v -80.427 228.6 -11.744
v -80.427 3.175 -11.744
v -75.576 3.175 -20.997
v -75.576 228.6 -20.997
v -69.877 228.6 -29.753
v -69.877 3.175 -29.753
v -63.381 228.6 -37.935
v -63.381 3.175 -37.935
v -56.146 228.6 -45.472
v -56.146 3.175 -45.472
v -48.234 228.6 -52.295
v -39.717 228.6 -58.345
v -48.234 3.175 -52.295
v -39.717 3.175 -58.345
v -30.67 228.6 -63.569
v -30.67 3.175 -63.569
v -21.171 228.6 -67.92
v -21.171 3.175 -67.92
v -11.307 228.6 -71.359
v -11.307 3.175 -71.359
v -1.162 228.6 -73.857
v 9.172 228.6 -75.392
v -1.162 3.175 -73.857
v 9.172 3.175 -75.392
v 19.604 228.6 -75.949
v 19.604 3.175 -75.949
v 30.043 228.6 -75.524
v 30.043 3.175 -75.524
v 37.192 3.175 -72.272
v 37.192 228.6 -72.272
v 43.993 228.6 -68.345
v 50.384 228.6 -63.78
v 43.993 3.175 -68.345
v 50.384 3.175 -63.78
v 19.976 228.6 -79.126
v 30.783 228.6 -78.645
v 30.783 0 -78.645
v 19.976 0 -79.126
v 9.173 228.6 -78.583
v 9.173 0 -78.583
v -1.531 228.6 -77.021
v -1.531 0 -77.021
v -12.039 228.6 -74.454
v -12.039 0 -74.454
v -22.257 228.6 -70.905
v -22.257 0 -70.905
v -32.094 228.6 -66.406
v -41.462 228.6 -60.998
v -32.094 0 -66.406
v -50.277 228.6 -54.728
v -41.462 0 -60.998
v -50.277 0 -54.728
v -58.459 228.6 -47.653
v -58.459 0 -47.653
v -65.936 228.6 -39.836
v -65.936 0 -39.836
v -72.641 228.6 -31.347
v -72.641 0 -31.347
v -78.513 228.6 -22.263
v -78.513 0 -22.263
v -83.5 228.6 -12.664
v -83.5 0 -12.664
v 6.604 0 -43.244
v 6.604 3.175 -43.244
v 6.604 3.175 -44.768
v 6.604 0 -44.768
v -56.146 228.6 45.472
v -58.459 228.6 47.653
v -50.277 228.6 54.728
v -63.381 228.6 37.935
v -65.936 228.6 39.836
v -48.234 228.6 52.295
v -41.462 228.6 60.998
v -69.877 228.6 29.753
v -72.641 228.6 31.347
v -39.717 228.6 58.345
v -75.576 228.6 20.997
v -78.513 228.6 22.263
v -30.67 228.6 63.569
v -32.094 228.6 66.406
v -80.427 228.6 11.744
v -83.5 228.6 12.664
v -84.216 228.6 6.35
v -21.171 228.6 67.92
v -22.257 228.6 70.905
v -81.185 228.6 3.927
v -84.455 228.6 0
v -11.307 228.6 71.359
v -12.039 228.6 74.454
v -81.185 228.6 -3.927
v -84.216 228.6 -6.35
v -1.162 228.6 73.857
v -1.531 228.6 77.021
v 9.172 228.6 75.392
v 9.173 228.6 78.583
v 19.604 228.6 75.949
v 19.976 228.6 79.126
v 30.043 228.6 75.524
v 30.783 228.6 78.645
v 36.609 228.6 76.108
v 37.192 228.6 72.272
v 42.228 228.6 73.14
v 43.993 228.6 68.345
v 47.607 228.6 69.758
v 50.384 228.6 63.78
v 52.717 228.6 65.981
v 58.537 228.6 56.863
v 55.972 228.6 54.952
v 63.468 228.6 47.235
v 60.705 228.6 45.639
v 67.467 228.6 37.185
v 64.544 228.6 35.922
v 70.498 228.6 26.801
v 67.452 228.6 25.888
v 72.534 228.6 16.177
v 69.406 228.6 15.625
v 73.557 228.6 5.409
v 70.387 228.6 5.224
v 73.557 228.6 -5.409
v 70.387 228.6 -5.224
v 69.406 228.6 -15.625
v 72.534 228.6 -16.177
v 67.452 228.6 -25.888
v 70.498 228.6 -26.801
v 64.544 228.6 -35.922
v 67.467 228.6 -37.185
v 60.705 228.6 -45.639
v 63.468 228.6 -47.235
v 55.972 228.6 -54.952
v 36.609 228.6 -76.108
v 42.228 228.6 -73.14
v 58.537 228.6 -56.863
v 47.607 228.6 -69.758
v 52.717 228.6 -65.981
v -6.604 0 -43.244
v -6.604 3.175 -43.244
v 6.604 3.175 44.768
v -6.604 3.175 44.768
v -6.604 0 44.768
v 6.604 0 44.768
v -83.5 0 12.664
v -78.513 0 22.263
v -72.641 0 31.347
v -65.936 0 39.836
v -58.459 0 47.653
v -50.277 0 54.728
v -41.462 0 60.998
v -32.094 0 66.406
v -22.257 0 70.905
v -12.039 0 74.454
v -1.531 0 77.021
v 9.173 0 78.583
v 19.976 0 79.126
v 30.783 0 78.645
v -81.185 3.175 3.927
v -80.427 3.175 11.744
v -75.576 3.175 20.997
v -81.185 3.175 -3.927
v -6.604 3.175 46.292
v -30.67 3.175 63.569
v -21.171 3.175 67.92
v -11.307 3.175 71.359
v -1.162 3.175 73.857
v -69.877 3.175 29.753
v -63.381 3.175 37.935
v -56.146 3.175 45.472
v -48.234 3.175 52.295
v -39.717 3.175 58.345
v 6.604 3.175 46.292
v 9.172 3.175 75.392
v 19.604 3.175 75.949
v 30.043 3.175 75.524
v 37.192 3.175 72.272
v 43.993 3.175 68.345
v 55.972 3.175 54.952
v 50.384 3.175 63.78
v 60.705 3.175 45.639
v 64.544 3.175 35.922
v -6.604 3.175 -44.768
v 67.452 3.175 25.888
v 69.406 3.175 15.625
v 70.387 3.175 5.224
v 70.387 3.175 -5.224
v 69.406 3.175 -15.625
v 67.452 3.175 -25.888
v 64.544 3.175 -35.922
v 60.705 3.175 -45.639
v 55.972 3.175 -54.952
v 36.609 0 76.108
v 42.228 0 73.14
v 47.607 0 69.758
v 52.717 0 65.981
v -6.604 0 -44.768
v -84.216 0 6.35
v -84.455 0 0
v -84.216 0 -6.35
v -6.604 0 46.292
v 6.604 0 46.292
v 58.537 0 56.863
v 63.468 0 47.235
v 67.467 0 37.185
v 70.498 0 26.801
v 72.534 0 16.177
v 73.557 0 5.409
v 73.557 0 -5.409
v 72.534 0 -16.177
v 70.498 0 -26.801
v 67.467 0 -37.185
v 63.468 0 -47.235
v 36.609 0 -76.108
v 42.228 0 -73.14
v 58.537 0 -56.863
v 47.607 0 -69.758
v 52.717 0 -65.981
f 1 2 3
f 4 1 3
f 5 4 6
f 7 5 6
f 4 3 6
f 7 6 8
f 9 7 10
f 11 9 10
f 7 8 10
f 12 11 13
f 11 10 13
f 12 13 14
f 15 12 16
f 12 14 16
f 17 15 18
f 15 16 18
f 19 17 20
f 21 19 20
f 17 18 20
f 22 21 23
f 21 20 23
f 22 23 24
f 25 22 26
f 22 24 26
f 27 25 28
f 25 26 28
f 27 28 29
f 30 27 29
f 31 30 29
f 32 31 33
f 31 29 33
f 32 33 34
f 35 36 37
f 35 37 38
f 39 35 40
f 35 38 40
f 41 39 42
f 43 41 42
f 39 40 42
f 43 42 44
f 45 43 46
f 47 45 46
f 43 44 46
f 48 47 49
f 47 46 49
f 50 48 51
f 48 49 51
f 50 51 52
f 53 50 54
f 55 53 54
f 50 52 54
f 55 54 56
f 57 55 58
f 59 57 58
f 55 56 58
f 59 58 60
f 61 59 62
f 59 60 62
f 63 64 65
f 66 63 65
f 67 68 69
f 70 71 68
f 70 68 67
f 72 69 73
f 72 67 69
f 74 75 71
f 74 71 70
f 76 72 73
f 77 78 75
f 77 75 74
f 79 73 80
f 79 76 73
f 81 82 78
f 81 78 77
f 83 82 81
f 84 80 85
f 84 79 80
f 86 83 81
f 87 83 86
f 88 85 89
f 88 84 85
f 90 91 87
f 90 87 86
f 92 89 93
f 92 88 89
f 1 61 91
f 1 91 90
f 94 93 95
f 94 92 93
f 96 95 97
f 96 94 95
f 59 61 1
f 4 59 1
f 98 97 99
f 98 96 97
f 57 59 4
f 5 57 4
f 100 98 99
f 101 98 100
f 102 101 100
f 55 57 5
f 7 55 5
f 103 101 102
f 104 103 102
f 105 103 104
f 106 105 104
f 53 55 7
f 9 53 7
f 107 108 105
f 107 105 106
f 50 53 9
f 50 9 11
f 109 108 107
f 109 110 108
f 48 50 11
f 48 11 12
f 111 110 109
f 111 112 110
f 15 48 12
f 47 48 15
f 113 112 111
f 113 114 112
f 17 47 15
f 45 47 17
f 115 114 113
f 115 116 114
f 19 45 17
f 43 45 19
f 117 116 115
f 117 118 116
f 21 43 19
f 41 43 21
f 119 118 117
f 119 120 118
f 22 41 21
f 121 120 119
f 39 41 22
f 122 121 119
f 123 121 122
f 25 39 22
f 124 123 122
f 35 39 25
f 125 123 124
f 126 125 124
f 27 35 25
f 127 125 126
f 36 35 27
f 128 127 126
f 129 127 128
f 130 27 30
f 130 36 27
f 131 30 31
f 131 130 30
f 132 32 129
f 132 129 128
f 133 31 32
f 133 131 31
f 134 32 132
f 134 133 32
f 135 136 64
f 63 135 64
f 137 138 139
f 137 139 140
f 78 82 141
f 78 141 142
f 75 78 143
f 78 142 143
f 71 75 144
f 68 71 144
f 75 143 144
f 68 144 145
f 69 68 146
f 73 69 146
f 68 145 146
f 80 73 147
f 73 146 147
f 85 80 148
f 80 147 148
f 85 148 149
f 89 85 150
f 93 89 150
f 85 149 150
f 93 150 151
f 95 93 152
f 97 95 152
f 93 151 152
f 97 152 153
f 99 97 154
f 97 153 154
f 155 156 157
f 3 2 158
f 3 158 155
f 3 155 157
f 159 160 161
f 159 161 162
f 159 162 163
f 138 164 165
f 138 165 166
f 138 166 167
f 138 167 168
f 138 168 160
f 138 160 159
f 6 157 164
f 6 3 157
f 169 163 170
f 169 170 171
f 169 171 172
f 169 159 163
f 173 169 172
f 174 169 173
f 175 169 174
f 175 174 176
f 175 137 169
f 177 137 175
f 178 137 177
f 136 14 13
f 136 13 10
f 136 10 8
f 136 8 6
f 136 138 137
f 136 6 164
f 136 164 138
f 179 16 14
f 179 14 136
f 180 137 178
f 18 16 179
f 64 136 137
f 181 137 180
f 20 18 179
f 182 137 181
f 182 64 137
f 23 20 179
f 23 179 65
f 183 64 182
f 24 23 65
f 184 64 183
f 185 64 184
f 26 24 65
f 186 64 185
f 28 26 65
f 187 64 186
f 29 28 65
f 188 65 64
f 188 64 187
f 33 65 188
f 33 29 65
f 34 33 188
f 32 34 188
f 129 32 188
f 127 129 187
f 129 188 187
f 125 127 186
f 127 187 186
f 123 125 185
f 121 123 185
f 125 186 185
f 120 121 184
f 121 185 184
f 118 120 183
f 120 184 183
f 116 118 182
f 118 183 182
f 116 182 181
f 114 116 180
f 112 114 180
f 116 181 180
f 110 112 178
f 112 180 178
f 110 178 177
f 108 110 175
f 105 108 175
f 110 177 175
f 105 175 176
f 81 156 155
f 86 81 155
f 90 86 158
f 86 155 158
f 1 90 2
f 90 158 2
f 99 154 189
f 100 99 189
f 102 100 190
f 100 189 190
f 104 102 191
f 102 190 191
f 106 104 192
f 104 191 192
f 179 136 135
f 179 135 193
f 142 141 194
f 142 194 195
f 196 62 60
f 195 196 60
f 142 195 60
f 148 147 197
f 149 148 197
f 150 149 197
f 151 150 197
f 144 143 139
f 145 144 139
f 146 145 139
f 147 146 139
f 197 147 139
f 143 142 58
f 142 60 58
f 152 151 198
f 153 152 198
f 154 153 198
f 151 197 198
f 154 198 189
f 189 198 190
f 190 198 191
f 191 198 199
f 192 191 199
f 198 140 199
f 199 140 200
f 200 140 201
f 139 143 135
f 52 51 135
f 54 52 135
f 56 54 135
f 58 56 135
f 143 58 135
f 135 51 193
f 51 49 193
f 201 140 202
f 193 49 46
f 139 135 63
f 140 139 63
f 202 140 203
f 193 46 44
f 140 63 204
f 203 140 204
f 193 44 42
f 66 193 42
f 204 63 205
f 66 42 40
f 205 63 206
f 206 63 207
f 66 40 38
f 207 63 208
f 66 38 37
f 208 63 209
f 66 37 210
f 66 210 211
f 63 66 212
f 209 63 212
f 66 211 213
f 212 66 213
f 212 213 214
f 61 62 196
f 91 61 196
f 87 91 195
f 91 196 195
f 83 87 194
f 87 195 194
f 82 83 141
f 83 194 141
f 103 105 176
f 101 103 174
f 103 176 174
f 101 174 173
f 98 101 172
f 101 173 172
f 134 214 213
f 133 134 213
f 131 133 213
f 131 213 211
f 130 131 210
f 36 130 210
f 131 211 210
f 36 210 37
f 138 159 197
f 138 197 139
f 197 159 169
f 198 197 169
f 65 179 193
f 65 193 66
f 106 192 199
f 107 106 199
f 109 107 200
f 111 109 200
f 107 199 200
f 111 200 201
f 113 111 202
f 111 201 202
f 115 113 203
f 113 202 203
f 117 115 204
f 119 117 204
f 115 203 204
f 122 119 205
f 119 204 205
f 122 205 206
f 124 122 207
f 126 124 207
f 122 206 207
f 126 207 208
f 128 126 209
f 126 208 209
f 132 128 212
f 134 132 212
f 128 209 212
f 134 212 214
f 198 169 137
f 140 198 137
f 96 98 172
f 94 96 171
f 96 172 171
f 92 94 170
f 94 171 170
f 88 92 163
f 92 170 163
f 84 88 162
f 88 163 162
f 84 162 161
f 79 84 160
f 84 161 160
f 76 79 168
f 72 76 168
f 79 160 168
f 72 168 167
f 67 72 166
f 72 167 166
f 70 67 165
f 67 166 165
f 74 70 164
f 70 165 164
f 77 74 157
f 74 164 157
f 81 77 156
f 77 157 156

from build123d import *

# Parameters (mm, degrees)
SIDES_THE_GAP_VALUE_CAN_BE_CHANGED_DEPTH      = 228.6
BASE_DEPTH                                    = 3.175
SKETCH8_W                                     = 13.208
SKETCH8_H                                     = 1.524
SHOCK_CORD_CUTS_CAN_BE_MOVED_CURRENT_DI_DEPTH = 4.175


with BuildPart() as part:
    # Sketch3 → Sides (the gap value can be changed) (new body)
    with BuildSketch(Plane(origin=(0, 0, 0), x_dir=(1, 0, 0), z_dir=(0, 1, 0))):
        with BuildLine():
            ThreePointArc((-83.500112782, 12.664051105), (-84.455, 0), (-83.500112782, -12.664051105))
            ThreePointArc((-83.500112782, -12.664051105), (-36.842428798, -63.812958552), (30.782666419, -78.645244441))
            ThreePointArc((30.782666419, -78.645244441), (42.2275, -73.140175477), (52.717446363, -65.981193335))
            ThreePointArc((52.717446363, -65.981193335), (73.684857596, 0), (52.717446363, 65.981193335))
            ThreePointArc((52.717446363, 65.981193335), (42.2275, 73.140175477), (30.782666419, 78.645244441))
            ThreePointArc((30.782666419, 78.645244441), (-36.842428798, 63.812958552), (-83.500112782, 12.664051105))
        make_face()
        with BuildLine():
            ThreePointArc((50.384378709, 63.779720775), (70.509857596, 0), (50.384378709, -63.779720775))
            ThreePointArc((50.384378709, -63.779720775), (40.64, -70.39054482), (30.042669082, -75.524012303))
            ThreePointArc((30.042669082, -75.524012303), (-35.254928798, -61.063327895), (-80.427047792, -11.744291529))
            ThreePointArc((-80.427047792, -11.744291529), (-81.28, 0), (-80.427047792, 11.744291529))
            ThreePointArc((-80.427047792, 11.744291529), (-35.254928798, 61.063327895), (30.042669082, 75.524012303))
            ThreePointArc((30.042669082, 75.524012303), (40.64, 70.39054482), (50.384378709, 63.779720775))
        make_face(mode=Mode.SUBTRACT)
    extrude(amount=SIDES_THE_GAP_VALUE_CAN_BE_CHANGED_DEPTH)

    # Sketch7 → base (add)
    with BuildSketch(Plane(origin=(0, 0, 0), x_dir=(1, 0, 0), z_dir=(0, 1, 0))):
        with BuildLine():
            ThreePointArc((50.384378709, 63.779720775), (40.64, 70.39054482), (30.042669082, 75.524012303))
            ThreePointArc((30.042669082, 75.524012303), (-35.254928798, 61.063327895), (-80.427047792, 11.744291529))
            ThreePointArc((-80.427047792, 11.744291529), (-81.28, 0), (-80.427047792, -11.744291529))
            ThreePointArc((-80.427047792, -11.744291529), (-35.254928798, -61.063327895), (30.042669082, -75.524012303))
            ThreePointArc((30.042669082, -75.524012303), (40.64, -70.39054482), (50.384378709, -63.779720775))
            ThreePointArc((50.384378709, -63.779720775), (70.509857596, 0), (50.384378709, 63.779720775))
        make_face()
    extrude(amount=BASE_DEPTH)

    # Sketch8 → Shock cord cuts(Can be moved, current dim arbitrary) (cut, through all)
    with BuildSketch(Plane(origin=(0, 3.175, 0), x_dir=(1, 0, 0), z_dir=(0, 1, 0))):
        with Locations((0, 44.0055)):
            Rectangle(SKETCH8_W, SKETCH8_H)
        with Locations((0, -45.5295)):
            Rectangle(SKETCH8_W, SKETCH8_H)
    extrude(amount=-SHOCK_CORD_CUTS_CAN_BE_MOVED_CURRENT_DI_DEPTH, mode=Mode.SUBTRACT)


solid = part.part
